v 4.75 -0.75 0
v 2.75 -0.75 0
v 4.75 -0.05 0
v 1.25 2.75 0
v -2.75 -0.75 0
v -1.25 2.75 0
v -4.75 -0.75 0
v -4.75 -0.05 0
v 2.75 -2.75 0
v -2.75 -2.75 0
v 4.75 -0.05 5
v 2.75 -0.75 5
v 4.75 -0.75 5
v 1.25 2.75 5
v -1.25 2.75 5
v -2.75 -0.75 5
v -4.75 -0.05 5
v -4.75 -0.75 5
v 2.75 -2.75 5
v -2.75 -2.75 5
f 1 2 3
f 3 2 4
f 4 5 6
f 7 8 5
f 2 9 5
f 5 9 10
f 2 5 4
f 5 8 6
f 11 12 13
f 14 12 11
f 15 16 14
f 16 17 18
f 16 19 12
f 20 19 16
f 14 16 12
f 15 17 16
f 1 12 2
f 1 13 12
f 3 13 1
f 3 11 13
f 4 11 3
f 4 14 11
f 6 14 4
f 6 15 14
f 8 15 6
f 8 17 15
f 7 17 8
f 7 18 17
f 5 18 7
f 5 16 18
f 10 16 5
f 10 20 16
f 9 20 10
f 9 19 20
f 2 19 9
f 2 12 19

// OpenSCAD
module extrude_hook(h, offset = 0.25)
{
  points = [[-3,-3],[3,-3],[3,-1],[5,-1],[5,0.2],[1.5,3],[-1.5,3],[-5,0.2],[-5,-1],[-3,-1]];
  pointsOffset = [[-offset,-offset],[offset,-offset],[offset,-offset],[offset,-offset],[offset,offset],[offset,offset],[-offset,offset],[-offset,offset],[-offset,-offset],[-offset,-offset]];
  
  newPoints = points - pointsOffset;
  
  linear_extrude(height=h)
      polygon(newPoints);
}

extrude_hook(5);
